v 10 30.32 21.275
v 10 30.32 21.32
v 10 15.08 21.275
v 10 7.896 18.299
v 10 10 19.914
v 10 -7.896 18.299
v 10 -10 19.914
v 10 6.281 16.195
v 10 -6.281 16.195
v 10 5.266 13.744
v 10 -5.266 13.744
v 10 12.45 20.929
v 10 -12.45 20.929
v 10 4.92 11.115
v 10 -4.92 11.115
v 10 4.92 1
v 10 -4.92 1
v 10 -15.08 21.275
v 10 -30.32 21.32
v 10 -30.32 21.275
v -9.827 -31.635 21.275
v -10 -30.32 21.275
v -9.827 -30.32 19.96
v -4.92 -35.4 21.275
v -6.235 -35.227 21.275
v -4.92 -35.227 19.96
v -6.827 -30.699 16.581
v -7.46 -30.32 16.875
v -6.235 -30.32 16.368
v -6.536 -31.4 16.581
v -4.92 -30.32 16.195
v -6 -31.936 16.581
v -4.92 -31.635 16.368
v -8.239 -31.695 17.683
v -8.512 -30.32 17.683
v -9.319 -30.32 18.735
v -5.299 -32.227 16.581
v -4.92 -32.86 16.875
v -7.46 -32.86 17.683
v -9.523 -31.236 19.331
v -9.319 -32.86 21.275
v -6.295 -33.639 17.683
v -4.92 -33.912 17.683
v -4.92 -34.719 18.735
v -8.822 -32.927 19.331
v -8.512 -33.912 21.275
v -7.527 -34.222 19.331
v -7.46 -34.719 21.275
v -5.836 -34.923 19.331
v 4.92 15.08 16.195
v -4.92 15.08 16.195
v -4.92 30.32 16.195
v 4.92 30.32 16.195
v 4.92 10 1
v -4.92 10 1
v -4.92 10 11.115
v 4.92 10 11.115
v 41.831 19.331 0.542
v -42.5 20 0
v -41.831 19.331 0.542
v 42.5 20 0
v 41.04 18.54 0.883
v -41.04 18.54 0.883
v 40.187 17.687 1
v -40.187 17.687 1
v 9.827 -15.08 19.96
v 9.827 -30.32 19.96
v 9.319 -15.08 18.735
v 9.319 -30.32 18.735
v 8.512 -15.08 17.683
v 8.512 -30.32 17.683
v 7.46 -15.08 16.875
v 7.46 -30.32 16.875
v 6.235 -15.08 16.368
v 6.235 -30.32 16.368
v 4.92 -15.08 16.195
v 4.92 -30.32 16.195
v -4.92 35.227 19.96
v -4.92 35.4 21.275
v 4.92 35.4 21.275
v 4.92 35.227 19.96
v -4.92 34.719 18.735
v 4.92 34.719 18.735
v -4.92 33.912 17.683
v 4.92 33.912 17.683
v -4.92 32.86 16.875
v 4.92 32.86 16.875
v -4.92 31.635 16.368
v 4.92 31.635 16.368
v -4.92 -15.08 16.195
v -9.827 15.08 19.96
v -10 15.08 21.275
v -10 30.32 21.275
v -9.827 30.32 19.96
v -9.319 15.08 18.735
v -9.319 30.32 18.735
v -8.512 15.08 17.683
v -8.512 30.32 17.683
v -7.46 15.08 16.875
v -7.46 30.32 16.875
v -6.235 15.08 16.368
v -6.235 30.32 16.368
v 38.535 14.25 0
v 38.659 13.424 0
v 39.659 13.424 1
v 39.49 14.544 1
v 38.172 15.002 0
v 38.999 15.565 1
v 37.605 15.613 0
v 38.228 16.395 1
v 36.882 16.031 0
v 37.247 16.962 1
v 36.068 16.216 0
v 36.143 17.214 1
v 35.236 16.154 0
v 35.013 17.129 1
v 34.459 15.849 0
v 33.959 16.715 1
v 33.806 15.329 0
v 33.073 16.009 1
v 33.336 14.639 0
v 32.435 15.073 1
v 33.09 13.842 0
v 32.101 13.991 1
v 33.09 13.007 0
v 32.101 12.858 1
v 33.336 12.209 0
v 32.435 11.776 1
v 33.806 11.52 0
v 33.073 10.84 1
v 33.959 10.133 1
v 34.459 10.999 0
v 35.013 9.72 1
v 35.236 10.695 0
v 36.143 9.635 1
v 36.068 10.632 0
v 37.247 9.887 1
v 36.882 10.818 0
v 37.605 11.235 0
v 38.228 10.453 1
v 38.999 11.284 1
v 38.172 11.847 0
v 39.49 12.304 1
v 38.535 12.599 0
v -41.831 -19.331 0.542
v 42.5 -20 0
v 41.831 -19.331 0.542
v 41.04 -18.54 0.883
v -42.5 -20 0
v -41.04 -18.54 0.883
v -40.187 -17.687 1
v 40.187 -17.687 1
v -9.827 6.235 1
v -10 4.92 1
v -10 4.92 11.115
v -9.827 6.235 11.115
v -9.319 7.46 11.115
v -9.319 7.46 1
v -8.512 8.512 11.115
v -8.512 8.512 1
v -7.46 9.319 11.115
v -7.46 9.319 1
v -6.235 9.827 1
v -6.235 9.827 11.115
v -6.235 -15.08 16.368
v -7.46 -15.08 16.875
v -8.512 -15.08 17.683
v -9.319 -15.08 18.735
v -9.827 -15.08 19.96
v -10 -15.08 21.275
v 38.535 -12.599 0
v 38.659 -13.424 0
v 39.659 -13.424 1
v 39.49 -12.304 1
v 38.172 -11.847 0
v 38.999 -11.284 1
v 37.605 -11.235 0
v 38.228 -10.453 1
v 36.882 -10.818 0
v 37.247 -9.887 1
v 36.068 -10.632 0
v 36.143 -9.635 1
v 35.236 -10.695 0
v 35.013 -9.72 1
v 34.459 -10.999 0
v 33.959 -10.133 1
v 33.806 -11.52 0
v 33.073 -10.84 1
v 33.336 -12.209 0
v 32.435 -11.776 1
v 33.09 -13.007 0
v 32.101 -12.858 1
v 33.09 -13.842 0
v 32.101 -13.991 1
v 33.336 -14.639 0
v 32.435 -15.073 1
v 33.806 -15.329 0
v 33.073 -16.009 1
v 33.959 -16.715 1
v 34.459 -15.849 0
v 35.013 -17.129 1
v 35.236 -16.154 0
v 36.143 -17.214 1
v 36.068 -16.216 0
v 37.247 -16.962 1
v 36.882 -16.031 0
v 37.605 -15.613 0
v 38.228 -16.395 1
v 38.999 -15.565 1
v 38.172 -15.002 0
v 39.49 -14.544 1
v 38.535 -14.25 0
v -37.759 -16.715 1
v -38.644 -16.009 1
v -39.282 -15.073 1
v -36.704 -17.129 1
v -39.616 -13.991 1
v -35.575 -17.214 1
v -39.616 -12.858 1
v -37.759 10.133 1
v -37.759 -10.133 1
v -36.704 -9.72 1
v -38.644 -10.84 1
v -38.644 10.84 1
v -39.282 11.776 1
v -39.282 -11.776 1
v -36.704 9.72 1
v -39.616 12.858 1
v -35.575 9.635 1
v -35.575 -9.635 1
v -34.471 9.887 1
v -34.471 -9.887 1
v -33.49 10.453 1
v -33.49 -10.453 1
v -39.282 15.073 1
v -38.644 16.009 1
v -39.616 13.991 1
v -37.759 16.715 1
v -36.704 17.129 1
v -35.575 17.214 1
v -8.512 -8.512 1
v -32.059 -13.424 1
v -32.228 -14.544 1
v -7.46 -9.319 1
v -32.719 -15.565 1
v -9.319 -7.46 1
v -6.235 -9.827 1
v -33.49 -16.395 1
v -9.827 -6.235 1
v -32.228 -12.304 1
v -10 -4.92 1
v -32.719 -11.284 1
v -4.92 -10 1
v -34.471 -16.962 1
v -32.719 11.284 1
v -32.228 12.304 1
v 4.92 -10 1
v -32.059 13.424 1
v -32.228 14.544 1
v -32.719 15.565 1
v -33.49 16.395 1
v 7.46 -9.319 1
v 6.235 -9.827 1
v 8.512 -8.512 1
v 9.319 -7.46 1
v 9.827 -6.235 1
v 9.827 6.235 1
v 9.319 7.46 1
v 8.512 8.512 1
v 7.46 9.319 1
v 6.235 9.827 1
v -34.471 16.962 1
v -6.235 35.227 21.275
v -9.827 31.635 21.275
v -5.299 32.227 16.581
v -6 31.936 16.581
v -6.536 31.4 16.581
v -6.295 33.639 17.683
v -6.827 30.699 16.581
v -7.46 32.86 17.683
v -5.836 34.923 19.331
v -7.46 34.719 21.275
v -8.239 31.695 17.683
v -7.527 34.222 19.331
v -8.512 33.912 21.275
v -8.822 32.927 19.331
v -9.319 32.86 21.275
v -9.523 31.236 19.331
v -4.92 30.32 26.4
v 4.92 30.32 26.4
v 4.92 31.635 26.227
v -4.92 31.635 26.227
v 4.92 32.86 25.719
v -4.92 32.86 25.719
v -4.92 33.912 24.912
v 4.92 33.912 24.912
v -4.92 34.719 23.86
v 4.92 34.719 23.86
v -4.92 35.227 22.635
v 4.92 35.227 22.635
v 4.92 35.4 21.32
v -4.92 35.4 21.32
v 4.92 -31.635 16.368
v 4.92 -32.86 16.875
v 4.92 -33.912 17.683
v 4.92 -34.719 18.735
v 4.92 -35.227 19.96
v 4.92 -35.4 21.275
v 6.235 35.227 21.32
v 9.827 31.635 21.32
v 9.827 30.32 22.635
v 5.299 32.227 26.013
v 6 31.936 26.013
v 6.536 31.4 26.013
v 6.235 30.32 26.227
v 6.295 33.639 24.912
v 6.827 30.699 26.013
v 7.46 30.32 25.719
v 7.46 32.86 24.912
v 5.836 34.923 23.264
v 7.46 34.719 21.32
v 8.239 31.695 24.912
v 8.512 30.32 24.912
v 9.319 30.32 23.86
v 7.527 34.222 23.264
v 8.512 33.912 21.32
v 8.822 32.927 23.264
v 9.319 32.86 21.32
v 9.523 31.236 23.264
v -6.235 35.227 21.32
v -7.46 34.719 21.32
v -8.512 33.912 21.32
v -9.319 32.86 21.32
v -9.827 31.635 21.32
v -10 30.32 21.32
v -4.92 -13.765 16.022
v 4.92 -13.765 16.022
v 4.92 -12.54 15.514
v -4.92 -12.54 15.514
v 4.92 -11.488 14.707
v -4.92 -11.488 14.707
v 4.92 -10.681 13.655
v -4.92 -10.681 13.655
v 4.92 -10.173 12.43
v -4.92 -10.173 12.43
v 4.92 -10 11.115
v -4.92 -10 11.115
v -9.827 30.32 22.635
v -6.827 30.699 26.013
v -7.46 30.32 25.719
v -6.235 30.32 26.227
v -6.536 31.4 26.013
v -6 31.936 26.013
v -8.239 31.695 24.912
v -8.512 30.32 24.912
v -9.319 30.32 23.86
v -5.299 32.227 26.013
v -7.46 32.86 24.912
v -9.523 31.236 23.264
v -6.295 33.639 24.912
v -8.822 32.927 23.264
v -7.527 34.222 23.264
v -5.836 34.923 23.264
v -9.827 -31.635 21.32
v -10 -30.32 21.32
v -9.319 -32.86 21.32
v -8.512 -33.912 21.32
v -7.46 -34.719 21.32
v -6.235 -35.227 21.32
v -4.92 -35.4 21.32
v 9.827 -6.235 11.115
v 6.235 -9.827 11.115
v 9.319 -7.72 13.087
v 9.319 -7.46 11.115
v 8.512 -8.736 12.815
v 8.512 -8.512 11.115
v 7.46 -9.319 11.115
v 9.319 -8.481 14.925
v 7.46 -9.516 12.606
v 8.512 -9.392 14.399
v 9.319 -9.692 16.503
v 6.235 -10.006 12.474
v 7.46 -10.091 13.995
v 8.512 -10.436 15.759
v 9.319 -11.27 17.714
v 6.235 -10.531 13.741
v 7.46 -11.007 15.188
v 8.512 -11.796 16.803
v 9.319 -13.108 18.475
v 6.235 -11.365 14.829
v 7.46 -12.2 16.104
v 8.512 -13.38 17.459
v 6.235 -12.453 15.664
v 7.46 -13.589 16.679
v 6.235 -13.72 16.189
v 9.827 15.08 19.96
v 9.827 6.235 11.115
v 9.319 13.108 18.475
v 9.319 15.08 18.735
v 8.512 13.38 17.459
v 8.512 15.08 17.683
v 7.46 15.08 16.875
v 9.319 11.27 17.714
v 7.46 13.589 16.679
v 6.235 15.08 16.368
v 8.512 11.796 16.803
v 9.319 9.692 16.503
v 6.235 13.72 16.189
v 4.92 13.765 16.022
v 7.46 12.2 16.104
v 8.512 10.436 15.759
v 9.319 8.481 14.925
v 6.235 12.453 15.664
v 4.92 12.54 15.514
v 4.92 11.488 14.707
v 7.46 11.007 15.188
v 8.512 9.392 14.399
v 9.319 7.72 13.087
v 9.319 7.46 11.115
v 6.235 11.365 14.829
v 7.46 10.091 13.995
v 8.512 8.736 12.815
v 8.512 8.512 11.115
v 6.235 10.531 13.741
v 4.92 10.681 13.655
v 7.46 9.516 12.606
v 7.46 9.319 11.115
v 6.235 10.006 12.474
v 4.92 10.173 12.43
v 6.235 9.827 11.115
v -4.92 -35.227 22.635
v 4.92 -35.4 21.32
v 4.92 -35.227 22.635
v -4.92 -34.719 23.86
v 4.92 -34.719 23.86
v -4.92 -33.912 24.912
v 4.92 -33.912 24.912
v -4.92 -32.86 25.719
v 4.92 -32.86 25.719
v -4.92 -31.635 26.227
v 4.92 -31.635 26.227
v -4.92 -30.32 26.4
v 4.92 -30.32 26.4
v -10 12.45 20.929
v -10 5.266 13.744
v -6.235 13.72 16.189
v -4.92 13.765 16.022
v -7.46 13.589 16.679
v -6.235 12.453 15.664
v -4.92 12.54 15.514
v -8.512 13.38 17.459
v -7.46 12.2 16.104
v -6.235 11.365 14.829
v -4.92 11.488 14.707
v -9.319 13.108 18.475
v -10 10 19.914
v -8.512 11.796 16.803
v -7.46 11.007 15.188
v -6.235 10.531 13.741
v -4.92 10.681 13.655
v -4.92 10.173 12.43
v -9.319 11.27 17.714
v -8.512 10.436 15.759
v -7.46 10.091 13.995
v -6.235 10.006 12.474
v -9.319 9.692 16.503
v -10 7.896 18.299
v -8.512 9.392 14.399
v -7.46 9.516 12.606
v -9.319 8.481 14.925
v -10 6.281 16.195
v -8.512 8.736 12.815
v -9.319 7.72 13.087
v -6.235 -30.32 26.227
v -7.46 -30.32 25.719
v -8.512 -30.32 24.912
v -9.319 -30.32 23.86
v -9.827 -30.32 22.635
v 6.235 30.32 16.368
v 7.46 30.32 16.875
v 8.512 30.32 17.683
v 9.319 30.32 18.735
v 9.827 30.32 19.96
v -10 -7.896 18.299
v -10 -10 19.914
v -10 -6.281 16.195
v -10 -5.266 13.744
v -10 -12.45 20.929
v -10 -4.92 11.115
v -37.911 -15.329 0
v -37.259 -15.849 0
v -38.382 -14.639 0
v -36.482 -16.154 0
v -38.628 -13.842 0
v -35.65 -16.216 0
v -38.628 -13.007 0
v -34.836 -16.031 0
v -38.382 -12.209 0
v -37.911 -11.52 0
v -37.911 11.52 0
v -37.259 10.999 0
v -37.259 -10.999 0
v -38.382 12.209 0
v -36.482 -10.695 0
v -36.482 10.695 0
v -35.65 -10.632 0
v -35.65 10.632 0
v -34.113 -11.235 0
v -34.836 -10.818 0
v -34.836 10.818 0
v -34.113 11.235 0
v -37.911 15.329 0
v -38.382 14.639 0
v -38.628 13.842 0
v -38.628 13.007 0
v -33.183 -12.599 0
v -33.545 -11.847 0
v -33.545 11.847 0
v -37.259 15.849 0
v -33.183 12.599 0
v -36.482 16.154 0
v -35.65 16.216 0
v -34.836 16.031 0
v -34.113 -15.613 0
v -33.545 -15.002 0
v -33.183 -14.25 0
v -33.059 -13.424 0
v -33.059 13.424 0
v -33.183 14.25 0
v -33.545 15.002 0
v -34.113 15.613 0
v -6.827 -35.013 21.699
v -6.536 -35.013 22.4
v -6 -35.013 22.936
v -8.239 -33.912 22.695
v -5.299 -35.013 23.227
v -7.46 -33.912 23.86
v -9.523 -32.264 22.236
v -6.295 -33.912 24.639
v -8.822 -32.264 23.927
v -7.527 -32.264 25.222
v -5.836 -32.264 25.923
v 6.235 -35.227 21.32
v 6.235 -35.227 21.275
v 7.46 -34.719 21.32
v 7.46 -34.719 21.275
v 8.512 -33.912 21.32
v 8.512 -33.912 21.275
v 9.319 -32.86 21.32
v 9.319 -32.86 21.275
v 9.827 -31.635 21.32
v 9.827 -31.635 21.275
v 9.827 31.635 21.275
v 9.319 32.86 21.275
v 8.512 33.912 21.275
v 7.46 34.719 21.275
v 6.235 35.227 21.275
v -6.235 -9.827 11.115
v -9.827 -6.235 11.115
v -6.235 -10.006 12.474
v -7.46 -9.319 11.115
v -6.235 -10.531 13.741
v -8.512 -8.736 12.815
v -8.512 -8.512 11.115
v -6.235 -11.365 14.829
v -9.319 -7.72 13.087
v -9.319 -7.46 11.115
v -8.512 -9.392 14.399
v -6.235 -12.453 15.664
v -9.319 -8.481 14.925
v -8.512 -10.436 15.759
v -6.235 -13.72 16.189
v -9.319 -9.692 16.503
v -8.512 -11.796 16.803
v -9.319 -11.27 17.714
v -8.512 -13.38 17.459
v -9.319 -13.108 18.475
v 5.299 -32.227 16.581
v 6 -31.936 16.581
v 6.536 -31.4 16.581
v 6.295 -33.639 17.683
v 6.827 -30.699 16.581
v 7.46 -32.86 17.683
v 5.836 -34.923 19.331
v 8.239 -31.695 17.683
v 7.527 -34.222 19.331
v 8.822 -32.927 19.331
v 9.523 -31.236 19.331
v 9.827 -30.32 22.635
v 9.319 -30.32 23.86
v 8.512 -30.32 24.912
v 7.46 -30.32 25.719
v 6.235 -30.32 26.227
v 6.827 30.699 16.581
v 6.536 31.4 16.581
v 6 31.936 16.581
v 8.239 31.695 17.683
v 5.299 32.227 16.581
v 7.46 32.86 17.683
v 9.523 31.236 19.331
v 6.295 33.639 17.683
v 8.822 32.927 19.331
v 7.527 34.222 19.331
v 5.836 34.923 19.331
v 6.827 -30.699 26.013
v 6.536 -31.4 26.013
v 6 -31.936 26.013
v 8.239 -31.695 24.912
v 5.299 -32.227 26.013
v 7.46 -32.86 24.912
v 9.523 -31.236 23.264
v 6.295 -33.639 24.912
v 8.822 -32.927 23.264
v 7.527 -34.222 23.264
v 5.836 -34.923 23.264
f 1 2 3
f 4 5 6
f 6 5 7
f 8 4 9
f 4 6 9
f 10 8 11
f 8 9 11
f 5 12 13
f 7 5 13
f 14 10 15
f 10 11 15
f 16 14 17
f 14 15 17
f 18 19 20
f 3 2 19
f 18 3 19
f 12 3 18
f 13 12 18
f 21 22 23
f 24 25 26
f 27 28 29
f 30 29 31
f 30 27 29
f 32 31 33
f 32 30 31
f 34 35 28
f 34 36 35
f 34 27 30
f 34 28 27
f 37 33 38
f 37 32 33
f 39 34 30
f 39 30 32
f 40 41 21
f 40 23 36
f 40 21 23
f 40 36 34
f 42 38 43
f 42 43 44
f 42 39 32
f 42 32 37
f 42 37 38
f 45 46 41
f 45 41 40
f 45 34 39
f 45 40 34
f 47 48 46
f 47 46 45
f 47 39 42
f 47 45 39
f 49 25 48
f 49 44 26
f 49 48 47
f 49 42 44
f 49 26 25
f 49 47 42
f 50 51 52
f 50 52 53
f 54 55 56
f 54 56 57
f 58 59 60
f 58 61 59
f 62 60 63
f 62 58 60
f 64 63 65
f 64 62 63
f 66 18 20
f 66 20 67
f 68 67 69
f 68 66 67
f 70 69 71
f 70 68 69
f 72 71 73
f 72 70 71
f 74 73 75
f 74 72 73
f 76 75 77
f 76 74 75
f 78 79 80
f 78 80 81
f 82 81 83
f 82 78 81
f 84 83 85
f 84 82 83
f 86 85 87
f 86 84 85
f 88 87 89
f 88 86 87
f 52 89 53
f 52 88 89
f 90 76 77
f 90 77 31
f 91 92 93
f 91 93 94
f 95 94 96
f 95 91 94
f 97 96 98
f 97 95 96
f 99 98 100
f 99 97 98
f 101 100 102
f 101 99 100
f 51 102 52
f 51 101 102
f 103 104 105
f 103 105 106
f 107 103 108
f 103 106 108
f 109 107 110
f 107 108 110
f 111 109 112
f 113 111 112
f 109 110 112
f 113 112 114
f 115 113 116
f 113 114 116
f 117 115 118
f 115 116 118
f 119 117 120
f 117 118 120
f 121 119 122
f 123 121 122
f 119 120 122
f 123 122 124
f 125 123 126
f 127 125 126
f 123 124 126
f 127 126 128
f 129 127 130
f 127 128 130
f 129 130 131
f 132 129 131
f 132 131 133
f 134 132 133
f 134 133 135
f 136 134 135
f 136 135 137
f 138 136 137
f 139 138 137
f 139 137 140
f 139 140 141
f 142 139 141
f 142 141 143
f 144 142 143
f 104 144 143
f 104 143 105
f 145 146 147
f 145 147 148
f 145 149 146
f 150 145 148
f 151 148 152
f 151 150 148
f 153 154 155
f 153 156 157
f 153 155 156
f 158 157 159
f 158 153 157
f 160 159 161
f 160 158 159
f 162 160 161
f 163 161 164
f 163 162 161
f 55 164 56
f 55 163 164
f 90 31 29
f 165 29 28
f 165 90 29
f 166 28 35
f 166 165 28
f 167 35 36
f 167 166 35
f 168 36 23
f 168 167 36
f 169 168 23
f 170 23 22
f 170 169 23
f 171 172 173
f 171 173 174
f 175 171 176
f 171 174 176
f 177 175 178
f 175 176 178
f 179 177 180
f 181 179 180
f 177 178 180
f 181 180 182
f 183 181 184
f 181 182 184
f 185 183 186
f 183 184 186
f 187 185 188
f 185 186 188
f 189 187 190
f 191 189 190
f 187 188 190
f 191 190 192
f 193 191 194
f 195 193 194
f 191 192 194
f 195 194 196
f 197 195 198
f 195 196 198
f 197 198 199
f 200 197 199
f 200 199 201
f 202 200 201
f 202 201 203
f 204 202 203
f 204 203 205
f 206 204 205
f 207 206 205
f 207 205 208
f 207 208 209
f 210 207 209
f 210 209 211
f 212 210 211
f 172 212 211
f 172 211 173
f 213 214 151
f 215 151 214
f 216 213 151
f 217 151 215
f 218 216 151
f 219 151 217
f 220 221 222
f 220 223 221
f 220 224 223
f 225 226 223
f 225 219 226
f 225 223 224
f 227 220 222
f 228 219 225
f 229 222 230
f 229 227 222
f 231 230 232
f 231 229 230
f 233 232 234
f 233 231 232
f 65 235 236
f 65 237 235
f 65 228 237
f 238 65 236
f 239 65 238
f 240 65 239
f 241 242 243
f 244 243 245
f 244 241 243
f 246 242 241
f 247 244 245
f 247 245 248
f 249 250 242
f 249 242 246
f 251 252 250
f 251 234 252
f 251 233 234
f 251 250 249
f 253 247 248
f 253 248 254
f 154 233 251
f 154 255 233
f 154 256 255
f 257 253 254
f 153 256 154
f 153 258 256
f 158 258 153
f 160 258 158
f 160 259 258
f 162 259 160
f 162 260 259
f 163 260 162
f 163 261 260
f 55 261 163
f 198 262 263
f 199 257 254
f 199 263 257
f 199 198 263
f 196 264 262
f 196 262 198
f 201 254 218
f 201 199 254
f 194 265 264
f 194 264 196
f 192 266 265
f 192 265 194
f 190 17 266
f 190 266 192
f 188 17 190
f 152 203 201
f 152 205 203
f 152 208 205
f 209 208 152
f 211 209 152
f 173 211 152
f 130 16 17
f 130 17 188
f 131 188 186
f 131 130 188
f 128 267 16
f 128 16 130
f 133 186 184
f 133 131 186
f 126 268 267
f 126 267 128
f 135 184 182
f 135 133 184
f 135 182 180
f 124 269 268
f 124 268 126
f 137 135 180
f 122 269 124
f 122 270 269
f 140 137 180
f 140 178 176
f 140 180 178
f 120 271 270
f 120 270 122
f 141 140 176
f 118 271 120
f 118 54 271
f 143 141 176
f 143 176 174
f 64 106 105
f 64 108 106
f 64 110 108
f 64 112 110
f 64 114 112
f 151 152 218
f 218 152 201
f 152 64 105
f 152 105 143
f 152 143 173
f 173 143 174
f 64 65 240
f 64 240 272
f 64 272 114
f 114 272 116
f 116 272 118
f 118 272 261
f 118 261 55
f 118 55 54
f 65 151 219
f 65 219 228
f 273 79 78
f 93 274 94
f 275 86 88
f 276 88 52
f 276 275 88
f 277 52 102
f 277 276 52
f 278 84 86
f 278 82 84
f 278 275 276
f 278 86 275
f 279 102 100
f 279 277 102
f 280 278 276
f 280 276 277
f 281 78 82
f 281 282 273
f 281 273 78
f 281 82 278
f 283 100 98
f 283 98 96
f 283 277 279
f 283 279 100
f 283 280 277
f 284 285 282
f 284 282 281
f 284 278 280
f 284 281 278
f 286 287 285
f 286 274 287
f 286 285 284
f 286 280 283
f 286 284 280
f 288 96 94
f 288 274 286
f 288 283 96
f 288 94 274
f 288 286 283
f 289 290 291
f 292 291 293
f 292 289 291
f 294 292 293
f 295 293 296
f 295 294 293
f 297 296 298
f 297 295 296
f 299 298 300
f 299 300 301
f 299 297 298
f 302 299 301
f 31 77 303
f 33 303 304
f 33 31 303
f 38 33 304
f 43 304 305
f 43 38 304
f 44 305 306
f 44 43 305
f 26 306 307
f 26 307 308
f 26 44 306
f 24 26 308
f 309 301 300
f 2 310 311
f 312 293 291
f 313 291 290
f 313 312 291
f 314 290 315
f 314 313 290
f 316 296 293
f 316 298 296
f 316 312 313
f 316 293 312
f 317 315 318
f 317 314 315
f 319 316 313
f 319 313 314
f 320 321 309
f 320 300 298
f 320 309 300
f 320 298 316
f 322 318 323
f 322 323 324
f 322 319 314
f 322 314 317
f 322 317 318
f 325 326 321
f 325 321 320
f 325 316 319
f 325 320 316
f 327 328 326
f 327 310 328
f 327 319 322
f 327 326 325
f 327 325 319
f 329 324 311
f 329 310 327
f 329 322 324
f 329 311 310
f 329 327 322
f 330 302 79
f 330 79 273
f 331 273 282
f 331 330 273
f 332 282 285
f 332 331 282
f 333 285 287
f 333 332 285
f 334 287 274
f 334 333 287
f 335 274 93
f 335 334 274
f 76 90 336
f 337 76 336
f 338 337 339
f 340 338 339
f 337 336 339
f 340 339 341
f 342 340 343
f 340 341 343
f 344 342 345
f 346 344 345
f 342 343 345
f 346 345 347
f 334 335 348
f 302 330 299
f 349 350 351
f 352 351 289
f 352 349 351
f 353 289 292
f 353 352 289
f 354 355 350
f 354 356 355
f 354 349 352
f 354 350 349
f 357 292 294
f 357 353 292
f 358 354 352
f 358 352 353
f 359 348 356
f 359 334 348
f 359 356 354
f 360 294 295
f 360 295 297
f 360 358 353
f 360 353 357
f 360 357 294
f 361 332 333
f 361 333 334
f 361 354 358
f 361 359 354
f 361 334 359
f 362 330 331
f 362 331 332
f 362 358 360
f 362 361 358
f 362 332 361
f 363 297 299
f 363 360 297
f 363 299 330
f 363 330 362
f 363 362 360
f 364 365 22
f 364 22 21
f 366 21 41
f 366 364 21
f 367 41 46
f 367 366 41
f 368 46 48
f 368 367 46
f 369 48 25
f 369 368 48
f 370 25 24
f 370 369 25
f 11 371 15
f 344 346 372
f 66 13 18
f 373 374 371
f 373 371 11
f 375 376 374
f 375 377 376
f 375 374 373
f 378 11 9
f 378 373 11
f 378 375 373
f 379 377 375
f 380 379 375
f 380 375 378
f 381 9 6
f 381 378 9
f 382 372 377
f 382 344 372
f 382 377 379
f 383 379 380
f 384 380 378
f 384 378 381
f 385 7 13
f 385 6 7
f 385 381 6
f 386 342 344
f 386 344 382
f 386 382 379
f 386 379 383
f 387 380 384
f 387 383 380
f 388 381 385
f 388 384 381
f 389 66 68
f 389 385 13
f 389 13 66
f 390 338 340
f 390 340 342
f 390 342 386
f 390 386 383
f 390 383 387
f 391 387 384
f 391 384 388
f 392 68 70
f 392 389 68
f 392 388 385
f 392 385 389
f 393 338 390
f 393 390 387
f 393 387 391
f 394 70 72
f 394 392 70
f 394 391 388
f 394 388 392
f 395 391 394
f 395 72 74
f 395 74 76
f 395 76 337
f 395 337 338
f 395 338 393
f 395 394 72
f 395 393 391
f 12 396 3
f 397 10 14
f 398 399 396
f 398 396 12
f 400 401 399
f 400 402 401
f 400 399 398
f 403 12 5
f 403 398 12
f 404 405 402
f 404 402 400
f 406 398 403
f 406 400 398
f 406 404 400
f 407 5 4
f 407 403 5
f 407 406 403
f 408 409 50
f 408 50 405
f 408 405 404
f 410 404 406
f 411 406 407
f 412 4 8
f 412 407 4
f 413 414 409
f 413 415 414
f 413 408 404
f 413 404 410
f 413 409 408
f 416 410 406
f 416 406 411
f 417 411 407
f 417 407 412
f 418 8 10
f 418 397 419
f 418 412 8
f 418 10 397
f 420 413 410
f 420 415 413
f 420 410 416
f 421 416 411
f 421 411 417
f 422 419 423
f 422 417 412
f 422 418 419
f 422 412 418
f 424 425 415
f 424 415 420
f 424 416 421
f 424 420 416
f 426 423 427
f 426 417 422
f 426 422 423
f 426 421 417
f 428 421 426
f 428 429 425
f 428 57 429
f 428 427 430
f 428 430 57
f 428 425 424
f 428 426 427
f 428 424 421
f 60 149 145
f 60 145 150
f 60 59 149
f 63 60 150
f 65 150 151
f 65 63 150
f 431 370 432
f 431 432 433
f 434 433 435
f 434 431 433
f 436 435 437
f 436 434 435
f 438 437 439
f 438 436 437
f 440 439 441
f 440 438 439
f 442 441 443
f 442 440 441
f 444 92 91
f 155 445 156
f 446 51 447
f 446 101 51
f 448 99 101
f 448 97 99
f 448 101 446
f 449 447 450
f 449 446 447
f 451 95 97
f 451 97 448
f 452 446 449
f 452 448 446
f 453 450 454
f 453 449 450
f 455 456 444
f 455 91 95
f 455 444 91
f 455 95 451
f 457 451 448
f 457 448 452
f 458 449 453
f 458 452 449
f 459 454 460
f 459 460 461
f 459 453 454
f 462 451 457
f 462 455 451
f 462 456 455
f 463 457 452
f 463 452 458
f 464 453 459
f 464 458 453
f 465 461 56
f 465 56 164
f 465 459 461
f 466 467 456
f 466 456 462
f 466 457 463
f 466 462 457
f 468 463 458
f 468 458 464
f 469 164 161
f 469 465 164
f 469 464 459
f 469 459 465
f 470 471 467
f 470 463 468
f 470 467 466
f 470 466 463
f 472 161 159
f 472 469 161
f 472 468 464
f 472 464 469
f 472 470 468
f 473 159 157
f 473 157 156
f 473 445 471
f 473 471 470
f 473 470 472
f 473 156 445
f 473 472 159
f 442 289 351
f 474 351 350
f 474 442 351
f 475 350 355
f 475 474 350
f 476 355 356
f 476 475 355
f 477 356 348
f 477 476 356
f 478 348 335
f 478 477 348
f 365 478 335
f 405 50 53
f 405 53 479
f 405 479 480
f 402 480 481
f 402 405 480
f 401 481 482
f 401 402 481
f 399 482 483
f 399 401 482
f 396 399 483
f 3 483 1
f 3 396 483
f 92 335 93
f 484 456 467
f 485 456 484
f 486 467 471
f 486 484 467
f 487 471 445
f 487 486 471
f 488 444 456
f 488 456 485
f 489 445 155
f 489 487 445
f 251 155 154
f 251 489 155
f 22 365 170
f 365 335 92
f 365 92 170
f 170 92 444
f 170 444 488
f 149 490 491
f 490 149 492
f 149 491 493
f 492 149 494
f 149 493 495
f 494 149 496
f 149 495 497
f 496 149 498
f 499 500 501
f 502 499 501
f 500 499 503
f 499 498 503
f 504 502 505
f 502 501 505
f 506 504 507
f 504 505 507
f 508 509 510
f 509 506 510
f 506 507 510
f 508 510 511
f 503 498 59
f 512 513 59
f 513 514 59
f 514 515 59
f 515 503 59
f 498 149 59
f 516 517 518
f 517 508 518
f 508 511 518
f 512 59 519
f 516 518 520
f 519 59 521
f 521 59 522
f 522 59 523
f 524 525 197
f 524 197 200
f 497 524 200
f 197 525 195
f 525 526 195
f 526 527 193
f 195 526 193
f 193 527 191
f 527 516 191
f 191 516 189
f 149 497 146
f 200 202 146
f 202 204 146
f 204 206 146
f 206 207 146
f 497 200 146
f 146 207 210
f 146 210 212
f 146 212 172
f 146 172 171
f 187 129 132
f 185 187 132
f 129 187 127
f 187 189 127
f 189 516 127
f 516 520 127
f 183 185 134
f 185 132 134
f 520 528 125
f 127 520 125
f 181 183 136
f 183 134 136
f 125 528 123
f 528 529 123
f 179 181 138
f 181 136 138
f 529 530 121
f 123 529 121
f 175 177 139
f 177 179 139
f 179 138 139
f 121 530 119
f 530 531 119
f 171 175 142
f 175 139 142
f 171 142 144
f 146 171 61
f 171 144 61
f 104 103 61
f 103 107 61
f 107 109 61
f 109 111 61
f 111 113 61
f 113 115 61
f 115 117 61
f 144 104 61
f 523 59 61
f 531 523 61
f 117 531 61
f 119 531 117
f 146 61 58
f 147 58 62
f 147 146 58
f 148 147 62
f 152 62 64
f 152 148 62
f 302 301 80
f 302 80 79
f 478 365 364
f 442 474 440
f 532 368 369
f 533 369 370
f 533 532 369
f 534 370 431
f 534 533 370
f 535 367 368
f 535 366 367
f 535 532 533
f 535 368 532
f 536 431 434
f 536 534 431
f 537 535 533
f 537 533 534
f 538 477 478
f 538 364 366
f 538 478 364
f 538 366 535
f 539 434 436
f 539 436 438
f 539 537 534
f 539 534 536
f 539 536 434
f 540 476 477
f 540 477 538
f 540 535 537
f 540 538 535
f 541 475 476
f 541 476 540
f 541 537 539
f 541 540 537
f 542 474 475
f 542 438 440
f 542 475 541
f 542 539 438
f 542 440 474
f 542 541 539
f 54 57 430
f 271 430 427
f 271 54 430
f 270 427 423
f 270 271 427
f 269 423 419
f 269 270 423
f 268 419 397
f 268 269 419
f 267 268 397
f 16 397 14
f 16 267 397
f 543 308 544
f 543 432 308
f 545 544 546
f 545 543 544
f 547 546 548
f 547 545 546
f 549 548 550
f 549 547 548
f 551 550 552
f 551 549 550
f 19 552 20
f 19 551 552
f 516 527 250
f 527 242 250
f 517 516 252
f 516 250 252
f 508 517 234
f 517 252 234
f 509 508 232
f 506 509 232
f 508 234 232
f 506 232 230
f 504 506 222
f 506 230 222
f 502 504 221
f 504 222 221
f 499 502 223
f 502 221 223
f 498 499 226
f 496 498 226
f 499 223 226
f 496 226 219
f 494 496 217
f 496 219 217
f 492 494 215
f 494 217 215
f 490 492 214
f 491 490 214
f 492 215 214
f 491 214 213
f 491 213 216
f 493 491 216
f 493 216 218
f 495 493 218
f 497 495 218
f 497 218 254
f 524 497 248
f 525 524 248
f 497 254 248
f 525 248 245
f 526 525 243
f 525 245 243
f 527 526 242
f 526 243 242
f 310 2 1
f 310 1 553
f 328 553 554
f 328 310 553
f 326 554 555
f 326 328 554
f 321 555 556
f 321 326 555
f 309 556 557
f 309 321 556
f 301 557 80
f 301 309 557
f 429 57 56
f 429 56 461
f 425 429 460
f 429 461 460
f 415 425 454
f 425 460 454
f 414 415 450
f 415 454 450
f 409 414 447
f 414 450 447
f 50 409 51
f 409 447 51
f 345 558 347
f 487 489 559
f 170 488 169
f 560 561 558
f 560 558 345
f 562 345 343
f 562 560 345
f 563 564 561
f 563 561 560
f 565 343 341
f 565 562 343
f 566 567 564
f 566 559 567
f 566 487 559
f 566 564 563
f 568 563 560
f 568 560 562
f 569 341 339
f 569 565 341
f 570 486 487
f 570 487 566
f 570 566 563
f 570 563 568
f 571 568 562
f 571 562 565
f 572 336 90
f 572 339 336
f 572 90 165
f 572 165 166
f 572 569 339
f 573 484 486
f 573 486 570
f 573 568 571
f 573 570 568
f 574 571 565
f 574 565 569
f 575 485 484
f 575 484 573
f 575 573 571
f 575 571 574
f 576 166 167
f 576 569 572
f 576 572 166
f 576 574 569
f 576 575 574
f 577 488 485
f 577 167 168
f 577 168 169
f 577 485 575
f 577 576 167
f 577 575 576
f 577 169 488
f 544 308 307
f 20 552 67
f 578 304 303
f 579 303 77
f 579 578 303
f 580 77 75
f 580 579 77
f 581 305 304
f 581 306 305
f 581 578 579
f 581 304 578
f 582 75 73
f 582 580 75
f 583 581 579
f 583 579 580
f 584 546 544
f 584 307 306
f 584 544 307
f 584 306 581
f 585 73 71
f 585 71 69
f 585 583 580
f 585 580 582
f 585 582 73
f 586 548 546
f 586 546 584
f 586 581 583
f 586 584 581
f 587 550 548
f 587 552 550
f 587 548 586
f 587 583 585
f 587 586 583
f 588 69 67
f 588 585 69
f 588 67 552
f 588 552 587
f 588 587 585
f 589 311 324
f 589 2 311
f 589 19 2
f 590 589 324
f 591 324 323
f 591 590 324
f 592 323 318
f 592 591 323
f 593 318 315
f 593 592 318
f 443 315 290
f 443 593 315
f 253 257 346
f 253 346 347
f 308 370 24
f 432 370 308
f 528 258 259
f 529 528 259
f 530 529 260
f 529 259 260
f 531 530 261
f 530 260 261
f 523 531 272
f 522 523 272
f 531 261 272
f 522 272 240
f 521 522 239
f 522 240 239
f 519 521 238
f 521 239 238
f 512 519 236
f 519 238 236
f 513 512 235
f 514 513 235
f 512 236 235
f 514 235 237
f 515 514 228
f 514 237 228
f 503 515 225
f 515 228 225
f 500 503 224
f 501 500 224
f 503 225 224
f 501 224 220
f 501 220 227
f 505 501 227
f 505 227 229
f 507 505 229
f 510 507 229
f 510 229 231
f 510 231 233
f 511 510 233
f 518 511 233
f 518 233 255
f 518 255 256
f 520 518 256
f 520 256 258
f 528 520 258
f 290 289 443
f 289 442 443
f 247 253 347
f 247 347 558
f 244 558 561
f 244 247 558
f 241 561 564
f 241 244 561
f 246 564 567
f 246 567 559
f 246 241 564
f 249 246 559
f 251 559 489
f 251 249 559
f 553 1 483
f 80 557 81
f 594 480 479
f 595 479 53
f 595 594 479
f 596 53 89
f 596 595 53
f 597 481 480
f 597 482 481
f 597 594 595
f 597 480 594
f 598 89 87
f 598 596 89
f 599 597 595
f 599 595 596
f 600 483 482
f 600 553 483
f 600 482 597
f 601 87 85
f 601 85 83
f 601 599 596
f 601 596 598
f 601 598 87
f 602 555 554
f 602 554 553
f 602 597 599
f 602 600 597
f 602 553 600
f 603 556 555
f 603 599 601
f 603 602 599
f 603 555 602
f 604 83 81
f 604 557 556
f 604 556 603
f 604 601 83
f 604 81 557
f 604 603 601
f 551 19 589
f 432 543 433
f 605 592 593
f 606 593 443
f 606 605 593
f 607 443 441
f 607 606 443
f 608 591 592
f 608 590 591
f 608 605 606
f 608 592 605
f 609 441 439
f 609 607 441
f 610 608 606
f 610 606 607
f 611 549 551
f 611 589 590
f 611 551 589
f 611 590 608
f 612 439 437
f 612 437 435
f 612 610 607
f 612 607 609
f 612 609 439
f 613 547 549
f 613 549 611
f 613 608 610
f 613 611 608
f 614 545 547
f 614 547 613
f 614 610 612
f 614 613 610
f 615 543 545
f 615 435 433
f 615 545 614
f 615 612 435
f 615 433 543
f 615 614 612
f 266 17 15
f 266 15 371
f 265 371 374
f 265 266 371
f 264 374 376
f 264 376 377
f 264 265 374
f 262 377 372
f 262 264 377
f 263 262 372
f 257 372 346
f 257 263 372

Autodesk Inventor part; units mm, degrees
ref_plane "YZ Plane" through (0, 0, 0) normal (1, 0, 0) x (0, 1, 0)
ref_plane "XZ Plane" through (0, 0, 0) normal (0, 1, 0) x (-1, 0, 0)
ref_plane "XY Plane" through (0, 0, 0) normal (0, 0, 1) x (1, 0, 0)
sketch "Sketch1" plane through (0, 0, 0) normal (0, 0, 1) x (1, 0, 0)
  line L0 (-42.5, -20) -> (42.5, -20)
  line L1 (42.5, -20) -> (42.5, 20)
  line L2 (42.5, 20) -> (-42.5, 20)
  line L3 (-42.5, 20) -> (-42.5, -20)
  line L4 (-42.5, -20) -> (42.5, 20) construction
  line L5 (42.5, -20) -> (-42.5, 20) construction
  point P0 (0, 0)
  dimension "d0" = 85
  dimension "d1" = 40
extrude "Extrusion1" add sketch "Sketch1" along normal blind 1
fillet "Fillet1" radius 3.175 4 edges at (-42.5, 0, 1) (0, 20, 1) (0, -20, 1) (42.5, 0, 1)
sketch "Sketch2" plane through (0, 0, 1) normal (0, 0, 1) x (1, 0, 0)
  line L0 (-40.187, -17.687) -> (-40.187, 17.687) construction
  line L1 (-40.187, 0) -> (40.187, 0) construction
  line L2 (40.187, 17.687) -> (40.187, -17.687) construction
  line L3 (-40.187, 17.687) -> (40.187, 17.687) construction
  line L4 (0, 17.687) -> (0, -17.687) construction
  line L5 (40.187, -17.687) -> (-40.187, -17.687) construction
  line L6 (10, -10) -> (-10, -10)
  line L7 (-10, -10) -> (-10, 10)
  line L8 (-10, 10) -> (10, 10)
  line L9 (10, 10) -> (10, -10)
  line L10 (10, -10) -> (-10, 10) construction
  line L11 (-10, -10) -> (10, 10) construction
  point P0 (0, 0)
  dimension "d5" = 20
  dimension "d6" = 20
extrude "Extrusion2" add sketch "Sketch2" along normal blind 25.4
sketch "Sketch3" plane through (-10, -10, 1) normal (0, -1, 0) x (1, 0, 0)
  line L0 (20, 25.4) -> (0, 25.4) projected
  line L1 (20, 0) -> (20, 25.4) projected
  line L2 (0, 25.4) -> (20, 25.4)
  line L3 (20, 25.4) -> (20, 15.1947)
  line L4 (20, 15.1947) -> (0, 15.1947)
  line L5 (0, 15.1947) -> (0, 25.4)
  point P0 (10, -1)
sketch "Sketch4" plane through (0, 0, 26.4) normal (0, 0, 1) x (1, 0, 0)
  line L0 (-10, -10) -> (-10, 10) construction
  line L1 (-10, 0) -> (10, 0) construction
  line L2 (10, 10) -> (10, -10) construction
  point P0 (0, 0)
ref_plane "Work Plane1" through (-10, 0, 26.4) normal (0, -1, 0) x (1, 0, 0)
extrude "Extrusion3" add sketch "Sketch3" along normal blind 25.4
mirror "Mirror1" about plane through (-10, 0, 26.4) normal (0, -1, 0) of "Extrusion3"
fillet "Fillet2" radius 5.08 2 edges at (0, -10, 16.1947) (0, 10, 16.1947)
fillet "Fillet3" radius 5.08 22 edges at (-10, 35.4, 21.2974) (10, 35.4, 21.2974) (0, 35.4, 16.1947) (0, 35.4, 26.4) (-10, 0, 26.4) (-10, -35.4, 21.2974) (10, -35.4, 21.2974) (10, 0, 26.4) (10, 11.4879, 14.7068) (10, 10, 6.0574) (10, 25.24, 16.1947) (-10, 11.4879, 14.7068) (-10, 10, 6.0574) (-10, 25.24, 16.1947) (-10, -11.4879, 14.7068) (-10, -10, 6.0574) (-10, -25.24, 16.1947) (0, -35.4, 16.1947) (10, -11.4879, 14.7068) (10, -10, 6.0574) (10, -25.24, 16.1947) (0, -35.4, 26.4)
sketch "Sketch5" plane through (0, 0, 1) normal (0, 0, 1) x (1, 0, 0)
  circle A0 centre (-35.8589, 13.4243) radius 2.8
  line L0 (59.5, 0) -> (-59.5, 0) projected
  line L1 (10, 4.92) -> (10, -4.92) projected
  arc A1 (4.92, -10) -> (10, -4.92) centre (4.92, -4.92) ccw projected
  line L2 (4.92, -10) -> (-4.92, -10) projected
  arc A2 (-10, -4.92) -> (-4.92, -10) centre (-4.92, -4.92) ccw projected
  line L3 (-10, -4.92) -> (-10, 4.92) projected
  arc A3 (-4.92, 10) -> (-10, 4.92) centre (-4.92, 4.92) ccw projected
  line L4 (-4.92, 10) -> (4.92, 10) projected
  arc A4 (10, 4.92) -> (4.92, 10) centre (4.92, 4.92) ccw projected
  line L5 (40.187, 17.687) -> (40.187, -17.687) projected
  line L6 (-40.187, 17.687) -> (40.187, 17.687) projected
  line L7 (-40.187, -17.687) -> (-40.187, 17.687) projected
  line L8 (40.187, -17.687) -> (-40.187, -17.687) projected
  circle A5 centre (-35.8589, -13.4243) radius 2.8
  line L9 (42.5, 20) -> (-42.5, 20) construction
  line L10 (0, 20) -> (0, -20) construction
  line L11 (-42.5, -20) -> (42.5, -20) construction
  circle A6 centre (35.8589, 13.4243) radius 2.8
  circle A7 centre (35.8589, -13.4243) radius 2.8
  point P0 (0, 0)
  dimension "d14" = 5.6
extrude "Extrusion4" cut sketch "Sketch5" against normal blind 345.1324 contours A0 | A5 | A6 | A7
chamfer "Chamfer1" distance 1 angle 45 4 edges at (33.0589, 13.4243, 1) (33.0589, -13.4243, 1) (-38.6589, 13.4243, 1) (-38.6589, -13.4243, 1)
properties part number "WireWrappoMatica(TM)"
